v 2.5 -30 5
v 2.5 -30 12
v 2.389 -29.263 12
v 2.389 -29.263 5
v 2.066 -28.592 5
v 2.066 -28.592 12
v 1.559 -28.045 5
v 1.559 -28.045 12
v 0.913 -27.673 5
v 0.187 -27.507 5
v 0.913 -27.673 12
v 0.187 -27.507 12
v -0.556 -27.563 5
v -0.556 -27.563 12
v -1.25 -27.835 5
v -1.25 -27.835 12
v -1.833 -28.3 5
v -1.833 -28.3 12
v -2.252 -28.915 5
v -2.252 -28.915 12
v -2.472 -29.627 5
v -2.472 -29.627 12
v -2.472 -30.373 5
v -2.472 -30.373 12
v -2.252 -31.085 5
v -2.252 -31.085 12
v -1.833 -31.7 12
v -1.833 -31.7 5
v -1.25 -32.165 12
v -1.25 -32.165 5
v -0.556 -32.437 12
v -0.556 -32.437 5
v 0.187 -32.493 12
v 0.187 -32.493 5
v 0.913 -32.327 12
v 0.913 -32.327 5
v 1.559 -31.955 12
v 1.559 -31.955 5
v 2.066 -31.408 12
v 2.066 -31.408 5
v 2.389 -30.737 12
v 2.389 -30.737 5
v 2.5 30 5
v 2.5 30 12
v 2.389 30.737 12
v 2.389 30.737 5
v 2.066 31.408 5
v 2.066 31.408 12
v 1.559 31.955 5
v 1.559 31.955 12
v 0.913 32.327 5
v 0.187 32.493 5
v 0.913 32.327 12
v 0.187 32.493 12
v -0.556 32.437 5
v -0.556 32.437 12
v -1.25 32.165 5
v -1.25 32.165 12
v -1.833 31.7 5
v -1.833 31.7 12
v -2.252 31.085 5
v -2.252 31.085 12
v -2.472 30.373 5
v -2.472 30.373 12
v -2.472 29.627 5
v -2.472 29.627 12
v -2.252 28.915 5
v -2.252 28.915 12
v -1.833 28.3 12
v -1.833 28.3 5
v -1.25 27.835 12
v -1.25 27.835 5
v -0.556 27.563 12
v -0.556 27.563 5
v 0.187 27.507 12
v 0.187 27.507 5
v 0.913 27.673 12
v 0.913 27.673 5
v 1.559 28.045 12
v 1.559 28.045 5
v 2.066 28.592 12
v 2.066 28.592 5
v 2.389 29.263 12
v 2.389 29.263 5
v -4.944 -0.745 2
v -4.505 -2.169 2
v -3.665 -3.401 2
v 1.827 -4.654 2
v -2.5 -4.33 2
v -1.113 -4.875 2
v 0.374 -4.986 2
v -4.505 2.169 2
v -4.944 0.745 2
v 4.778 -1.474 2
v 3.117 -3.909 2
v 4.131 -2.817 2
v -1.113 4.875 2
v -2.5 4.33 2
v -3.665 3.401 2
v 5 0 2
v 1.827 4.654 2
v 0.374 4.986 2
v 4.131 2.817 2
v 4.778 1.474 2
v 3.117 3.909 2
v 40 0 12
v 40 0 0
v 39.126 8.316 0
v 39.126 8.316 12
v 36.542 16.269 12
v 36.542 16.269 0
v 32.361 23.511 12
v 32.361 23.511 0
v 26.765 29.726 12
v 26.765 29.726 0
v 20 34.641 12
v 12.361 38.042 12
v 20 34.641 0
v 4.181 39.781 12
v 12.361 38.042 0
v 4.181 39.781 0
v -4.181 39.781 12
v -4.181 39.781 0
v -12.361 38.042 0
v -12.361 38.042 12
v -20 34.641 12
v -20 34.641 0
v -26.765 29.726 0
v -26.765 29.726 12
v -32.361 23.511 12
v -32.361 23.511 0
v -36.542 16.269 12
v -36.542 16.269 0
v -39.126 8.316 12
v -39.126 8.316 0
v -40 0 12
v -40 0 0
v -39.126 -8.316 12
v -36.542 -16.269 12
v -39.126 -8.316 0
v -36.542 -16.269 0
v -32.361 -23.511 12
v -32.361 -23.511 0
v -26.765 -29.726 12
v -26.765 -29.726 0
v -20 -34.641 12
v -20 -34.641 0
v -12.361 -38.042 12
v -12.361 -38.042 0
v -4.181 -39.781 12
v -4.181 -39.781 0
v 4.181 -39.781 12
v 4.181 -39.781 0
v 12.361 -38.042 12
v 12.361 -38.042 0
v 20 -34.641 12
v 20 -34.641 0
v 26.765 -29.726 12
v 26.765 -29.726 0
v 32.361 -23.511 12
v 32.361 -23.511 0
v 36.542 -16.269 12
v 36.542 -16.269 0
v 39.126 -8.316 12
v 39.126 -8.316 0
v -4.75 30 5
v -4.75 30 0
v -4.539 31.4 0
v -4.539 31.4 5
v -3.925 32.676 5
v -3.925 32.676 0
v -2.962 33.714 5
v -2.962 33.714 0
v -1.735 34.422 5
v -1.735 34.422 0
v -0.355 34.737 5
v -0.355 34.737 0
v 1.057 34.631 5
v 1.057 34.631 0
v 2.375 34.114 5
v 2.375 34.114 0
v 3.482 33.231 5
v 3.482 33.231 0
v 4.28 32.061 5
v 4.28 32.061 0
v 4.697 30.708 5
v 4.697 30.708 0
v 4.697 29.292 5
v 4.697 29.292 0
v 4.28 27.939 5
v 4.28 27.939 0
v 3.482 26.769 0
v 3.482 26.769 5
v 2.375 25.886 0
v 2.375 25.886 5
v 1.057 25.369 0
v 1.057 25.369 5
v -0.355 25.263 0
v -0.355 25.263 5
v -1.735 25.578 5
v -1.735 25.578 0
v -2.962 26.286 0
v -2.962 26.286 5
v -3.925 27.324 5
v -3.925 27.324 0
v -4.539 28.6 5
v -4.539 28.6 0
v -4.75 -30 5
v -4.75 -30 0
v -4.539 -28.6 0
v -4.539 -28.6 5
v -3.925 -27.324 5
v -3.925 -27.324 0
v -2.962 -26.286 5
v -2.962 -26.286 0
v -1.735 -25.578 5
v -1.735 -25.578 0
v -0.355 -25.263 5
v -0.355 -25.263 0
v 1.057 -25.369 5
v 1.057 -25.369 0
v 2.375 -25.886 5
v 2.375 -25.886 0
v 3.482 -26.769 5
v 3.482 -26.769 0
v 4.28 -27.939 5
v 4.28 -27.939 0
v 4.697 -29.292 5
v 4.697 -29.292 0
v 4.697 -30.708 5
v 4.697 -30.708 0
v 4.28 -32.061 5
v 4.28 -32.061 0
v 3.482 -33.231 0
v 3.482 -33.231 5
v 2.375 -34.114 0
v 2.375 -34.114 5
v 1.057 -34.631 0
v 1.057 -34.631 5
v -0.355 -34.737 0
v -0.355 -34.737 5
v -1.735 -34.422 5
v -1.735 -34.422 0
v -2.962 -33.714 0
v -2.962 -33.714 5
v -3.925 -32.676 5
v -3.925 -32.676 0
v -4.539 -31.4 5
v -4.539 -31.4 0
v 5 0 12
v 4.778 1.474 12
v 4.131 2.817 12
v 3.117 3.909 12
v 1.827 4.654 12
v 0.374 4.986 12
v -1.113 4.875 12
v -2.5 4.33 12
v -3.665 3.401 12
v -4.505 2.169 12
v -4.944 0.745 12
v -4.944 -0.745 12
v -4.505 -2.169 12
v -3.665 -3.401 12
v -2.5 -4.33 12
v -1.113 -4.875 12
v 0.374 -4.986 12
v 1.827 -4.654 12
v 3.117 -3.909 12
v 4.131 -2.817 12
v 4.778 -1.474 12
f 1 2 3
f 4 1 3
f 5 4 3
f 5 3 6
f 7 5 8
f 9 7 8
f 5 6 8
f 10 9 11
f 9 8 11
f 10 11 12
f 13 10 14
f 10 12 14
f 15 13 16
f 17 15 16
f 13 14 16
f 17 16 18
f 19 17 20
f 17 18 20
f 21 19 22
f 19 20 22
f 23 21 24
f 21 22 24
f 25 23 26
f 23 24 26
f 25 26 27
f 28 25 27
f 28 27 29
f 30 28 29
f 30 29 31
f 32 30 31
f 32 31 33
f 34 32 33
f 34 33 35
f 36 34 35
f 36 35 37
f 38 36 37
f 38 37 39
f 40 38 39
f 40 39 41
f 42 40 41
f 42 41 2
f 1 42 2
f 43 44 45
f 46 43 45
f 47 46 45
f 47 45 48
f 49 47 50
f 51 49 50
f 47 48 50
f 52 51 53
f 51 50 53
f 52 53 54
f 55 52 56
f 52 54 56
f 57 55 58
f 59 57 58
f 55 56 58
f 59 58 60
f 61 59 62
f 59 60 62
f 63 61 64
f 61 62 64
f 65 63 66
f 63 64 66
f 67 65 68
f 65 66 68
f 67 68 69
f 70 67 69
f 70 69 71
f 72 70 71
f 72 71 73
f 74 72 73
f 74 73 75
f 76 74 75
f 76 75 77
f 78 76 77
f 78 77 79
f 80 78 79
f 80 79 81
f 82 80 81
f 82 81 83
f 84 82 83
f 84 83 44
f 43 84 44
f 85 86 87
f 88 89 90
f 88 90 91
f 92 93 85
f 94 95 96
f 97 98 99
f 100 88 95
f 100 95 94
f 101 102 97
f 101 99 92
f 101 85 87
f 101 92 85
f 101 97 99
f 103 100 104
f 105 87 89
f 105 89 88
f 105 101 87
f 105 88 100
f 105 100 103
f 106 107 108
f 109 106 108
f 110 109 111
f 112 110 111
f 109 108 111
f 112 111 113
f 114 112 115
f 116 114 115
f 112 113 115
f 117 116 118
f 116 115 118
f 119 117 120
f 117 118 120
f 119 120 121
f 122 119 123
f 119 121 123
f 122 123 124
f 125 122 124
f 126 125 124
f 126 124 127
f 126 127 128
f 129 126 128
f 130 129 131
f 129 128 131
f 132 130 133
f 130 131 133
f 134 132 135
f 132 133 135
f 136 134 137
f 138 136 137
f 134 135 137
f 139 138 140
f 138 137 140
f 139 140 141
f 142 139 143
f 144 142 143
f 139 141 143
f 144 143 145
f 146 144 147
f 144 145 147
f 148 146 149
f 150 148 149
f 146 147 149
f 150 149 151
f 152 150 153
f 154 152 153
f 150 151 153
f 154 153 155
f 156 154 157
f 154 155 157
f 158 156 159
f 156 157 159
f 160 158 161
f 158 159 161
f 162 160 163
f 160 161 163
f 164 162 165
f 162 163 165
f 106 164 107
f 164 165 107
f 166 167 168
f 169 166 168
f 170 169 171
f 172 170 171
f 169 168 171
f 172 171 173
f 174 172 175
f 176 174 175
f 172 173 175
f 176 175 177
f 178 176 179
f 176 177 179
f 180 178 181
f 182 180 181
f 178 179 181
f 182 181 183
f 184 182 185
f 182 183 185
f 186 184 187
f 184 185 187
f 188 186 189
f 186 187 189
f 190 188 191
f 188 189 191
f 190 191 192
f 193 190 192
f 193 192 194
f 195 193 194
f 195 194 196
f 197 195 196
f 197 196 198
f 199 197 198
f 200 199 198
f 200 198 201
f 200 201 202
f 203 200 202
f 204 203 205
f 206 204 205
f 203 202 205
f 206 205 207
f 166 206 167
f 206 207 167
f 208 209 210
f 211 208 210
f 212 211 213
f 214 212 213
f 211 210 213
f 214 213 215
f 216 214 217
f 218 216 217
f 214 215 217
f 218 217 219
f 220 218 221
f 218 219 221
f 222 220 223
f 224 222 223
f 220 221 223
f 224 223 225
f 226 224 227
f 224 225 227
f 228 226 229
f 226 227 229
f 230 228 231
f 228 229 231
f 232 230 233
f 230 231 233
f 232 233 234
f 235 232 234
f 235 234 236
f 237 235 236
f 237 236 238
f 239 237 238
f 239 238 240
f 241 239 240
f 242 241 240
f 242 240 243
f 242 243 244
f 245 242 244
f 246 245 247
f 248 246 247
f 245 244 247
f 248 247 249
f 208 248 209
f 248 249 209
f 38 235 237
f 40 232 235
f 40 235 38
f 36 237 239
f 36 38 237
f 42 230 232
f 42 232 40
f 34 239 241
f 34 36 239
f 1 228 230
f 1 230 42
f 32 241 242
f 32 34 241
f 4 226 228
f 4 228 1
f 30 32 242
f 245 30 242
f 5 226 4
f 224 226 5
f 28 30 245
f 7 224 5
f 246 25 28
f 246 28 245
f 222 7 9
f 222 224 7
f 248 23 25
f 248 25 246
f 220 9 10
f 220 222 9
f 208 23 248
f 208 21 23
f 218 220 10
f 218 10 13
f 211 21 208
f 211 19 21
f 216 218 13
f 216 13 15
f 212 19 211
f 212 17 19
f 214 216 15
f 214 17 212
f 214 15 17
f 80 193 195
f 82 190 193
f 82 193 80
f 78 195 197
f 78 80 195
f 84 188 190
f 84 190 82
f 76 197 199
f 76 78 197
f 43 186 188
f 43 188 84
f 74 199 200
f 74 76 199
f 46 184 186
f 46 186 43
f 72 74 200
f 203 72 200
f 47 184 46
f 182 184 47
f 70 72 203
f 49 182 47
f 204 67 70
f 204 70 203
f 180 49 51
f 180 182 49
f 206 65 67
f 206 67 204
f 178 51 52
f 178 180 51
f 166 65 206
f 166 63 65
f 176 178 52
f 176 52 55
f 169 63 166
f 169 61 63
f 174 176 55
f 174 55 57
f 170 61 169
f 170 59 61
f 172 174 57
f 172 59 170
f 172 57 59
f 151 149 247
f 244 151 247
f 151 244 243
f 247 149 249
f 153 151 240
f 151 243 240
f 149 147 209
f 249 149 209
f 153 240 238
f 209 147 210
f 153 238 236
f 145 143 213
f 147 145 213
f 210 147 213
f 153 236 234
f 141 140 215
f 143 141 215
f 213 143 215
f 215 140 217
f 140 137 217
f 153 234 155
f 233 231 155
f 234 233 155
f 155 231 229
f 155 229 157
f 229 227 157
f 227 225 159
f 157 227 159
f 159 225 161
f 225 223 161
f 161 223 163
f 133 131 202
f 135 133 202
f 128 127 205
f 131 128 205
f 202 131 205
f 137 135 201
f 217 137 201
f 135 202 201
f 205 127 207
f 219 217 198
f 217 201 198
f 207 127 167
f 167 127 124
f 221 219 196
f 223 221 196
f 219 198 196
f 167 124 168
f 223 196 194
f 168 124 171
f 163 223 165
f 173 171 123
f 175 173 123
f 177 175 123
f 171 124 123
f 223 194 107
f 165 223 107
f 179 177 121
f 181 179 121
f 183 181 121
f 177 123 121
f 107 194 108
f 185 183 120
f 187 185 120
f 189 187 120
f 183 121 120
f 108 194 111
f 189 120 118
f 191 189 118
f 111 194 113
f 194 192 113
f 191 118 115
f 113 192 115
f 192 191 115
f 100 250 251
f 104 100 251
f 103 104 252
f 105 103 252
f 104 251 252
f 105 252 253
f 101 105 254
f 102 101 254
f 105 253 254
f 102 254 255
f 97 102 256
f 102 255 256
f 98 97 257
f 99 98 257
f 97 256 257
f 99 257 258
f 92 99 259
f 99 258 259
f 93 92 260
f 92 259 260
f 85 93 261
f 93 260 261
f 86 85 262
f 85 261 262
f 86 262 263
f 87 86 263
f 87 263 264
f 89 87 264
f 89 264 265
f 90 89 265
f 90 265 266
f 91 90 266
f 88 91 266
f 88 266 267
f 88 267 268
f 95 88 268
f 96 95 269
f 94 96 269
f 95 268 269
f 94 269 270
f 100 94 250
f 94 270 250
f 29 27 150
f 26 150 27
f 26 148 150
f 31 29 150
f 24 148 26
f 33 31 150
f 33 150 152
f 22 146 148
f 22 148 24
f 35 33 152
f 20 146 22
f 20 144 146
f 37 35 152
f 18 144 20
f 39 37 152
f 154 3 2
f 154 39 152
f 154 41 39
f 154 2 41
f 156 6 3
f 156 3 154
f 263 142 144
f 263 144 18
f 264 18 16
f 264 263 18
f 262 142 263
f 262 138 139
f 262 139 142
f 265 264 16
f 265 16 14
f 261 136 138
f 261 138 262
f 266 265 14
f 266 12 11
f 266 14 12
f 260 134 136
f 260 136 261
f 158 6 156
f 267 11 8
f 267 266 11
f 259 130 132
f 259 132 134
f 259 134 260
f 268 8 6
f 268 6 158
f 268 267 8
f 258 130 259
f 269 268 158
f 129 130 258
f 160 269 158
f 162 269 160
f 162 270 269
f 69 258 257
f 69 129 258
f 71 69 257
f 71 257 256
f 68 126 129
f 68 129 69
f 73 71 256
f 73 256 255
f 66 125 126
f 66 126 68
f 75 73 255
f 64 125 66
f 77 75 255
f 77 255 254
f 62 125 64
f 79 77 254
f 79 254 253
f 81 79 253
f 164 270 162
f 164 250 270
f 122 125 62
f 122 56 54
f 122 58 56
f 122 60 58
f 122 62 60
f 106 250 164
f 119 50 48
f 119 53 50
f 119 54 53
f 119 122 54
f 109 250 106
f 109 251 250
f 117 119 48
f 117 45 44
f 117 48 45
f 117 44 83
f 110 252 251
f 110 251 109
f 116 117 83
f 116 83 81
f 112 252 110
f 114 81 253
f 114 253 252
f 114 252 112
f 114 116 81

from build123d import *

# Parameters (mm, degrees)
SKETCH_1_R          = 40
EXTRUDE_1_DEPTH     = 12
SKETCH_2_R          = 5
SKETCH_2_R_2        = 2.5
CUT_EXTRUDE_1_DEPTH = 10
SKETCH_3_R          = 4.75
CUT_EXTRUDE_2_DEPTH = 5


with BuildPart() as part:
    # 草图1 → 凸台-拉伸1 (new body)
    with BuildSketch(Plane.XY):
        Circle(SKETCH_1_R)
    extrude(amount=EXTRUDE_1_DEPTH)

    # 草图2 → 切除-拉伸1 (cut)
    with BuildSketch(Plane.XY.offset(12)):
        Circle(SKETCH_2_R)
        with Locations((0, 30)):
            Circle(SKETCH_2_R_2)
        with Locations((0, -30)):
            Circle(SKETCH_2_R_2)
    extrude(amount=-CUT_EXTRUDE_1_DEPTH, mode=Mode.SUBTRACT)

    # 草图3 → 切除-拉伸2 (cut)
    with BuildSketch(Plane(origin=(0, 0, 0), x_dir=(-1, 0, 0), z_dir=(0, 0, -1))):
        with Locations((0, -30)):
            Circle(SKETCH_3_R)
        with Locations((0, 30)):
            Circle(SKETCH_3_R)
    extrude(amount=-CUT_EXTRUDE_2_DEPTH, mode=Mode.SUBTRACT)


solid = part.part
